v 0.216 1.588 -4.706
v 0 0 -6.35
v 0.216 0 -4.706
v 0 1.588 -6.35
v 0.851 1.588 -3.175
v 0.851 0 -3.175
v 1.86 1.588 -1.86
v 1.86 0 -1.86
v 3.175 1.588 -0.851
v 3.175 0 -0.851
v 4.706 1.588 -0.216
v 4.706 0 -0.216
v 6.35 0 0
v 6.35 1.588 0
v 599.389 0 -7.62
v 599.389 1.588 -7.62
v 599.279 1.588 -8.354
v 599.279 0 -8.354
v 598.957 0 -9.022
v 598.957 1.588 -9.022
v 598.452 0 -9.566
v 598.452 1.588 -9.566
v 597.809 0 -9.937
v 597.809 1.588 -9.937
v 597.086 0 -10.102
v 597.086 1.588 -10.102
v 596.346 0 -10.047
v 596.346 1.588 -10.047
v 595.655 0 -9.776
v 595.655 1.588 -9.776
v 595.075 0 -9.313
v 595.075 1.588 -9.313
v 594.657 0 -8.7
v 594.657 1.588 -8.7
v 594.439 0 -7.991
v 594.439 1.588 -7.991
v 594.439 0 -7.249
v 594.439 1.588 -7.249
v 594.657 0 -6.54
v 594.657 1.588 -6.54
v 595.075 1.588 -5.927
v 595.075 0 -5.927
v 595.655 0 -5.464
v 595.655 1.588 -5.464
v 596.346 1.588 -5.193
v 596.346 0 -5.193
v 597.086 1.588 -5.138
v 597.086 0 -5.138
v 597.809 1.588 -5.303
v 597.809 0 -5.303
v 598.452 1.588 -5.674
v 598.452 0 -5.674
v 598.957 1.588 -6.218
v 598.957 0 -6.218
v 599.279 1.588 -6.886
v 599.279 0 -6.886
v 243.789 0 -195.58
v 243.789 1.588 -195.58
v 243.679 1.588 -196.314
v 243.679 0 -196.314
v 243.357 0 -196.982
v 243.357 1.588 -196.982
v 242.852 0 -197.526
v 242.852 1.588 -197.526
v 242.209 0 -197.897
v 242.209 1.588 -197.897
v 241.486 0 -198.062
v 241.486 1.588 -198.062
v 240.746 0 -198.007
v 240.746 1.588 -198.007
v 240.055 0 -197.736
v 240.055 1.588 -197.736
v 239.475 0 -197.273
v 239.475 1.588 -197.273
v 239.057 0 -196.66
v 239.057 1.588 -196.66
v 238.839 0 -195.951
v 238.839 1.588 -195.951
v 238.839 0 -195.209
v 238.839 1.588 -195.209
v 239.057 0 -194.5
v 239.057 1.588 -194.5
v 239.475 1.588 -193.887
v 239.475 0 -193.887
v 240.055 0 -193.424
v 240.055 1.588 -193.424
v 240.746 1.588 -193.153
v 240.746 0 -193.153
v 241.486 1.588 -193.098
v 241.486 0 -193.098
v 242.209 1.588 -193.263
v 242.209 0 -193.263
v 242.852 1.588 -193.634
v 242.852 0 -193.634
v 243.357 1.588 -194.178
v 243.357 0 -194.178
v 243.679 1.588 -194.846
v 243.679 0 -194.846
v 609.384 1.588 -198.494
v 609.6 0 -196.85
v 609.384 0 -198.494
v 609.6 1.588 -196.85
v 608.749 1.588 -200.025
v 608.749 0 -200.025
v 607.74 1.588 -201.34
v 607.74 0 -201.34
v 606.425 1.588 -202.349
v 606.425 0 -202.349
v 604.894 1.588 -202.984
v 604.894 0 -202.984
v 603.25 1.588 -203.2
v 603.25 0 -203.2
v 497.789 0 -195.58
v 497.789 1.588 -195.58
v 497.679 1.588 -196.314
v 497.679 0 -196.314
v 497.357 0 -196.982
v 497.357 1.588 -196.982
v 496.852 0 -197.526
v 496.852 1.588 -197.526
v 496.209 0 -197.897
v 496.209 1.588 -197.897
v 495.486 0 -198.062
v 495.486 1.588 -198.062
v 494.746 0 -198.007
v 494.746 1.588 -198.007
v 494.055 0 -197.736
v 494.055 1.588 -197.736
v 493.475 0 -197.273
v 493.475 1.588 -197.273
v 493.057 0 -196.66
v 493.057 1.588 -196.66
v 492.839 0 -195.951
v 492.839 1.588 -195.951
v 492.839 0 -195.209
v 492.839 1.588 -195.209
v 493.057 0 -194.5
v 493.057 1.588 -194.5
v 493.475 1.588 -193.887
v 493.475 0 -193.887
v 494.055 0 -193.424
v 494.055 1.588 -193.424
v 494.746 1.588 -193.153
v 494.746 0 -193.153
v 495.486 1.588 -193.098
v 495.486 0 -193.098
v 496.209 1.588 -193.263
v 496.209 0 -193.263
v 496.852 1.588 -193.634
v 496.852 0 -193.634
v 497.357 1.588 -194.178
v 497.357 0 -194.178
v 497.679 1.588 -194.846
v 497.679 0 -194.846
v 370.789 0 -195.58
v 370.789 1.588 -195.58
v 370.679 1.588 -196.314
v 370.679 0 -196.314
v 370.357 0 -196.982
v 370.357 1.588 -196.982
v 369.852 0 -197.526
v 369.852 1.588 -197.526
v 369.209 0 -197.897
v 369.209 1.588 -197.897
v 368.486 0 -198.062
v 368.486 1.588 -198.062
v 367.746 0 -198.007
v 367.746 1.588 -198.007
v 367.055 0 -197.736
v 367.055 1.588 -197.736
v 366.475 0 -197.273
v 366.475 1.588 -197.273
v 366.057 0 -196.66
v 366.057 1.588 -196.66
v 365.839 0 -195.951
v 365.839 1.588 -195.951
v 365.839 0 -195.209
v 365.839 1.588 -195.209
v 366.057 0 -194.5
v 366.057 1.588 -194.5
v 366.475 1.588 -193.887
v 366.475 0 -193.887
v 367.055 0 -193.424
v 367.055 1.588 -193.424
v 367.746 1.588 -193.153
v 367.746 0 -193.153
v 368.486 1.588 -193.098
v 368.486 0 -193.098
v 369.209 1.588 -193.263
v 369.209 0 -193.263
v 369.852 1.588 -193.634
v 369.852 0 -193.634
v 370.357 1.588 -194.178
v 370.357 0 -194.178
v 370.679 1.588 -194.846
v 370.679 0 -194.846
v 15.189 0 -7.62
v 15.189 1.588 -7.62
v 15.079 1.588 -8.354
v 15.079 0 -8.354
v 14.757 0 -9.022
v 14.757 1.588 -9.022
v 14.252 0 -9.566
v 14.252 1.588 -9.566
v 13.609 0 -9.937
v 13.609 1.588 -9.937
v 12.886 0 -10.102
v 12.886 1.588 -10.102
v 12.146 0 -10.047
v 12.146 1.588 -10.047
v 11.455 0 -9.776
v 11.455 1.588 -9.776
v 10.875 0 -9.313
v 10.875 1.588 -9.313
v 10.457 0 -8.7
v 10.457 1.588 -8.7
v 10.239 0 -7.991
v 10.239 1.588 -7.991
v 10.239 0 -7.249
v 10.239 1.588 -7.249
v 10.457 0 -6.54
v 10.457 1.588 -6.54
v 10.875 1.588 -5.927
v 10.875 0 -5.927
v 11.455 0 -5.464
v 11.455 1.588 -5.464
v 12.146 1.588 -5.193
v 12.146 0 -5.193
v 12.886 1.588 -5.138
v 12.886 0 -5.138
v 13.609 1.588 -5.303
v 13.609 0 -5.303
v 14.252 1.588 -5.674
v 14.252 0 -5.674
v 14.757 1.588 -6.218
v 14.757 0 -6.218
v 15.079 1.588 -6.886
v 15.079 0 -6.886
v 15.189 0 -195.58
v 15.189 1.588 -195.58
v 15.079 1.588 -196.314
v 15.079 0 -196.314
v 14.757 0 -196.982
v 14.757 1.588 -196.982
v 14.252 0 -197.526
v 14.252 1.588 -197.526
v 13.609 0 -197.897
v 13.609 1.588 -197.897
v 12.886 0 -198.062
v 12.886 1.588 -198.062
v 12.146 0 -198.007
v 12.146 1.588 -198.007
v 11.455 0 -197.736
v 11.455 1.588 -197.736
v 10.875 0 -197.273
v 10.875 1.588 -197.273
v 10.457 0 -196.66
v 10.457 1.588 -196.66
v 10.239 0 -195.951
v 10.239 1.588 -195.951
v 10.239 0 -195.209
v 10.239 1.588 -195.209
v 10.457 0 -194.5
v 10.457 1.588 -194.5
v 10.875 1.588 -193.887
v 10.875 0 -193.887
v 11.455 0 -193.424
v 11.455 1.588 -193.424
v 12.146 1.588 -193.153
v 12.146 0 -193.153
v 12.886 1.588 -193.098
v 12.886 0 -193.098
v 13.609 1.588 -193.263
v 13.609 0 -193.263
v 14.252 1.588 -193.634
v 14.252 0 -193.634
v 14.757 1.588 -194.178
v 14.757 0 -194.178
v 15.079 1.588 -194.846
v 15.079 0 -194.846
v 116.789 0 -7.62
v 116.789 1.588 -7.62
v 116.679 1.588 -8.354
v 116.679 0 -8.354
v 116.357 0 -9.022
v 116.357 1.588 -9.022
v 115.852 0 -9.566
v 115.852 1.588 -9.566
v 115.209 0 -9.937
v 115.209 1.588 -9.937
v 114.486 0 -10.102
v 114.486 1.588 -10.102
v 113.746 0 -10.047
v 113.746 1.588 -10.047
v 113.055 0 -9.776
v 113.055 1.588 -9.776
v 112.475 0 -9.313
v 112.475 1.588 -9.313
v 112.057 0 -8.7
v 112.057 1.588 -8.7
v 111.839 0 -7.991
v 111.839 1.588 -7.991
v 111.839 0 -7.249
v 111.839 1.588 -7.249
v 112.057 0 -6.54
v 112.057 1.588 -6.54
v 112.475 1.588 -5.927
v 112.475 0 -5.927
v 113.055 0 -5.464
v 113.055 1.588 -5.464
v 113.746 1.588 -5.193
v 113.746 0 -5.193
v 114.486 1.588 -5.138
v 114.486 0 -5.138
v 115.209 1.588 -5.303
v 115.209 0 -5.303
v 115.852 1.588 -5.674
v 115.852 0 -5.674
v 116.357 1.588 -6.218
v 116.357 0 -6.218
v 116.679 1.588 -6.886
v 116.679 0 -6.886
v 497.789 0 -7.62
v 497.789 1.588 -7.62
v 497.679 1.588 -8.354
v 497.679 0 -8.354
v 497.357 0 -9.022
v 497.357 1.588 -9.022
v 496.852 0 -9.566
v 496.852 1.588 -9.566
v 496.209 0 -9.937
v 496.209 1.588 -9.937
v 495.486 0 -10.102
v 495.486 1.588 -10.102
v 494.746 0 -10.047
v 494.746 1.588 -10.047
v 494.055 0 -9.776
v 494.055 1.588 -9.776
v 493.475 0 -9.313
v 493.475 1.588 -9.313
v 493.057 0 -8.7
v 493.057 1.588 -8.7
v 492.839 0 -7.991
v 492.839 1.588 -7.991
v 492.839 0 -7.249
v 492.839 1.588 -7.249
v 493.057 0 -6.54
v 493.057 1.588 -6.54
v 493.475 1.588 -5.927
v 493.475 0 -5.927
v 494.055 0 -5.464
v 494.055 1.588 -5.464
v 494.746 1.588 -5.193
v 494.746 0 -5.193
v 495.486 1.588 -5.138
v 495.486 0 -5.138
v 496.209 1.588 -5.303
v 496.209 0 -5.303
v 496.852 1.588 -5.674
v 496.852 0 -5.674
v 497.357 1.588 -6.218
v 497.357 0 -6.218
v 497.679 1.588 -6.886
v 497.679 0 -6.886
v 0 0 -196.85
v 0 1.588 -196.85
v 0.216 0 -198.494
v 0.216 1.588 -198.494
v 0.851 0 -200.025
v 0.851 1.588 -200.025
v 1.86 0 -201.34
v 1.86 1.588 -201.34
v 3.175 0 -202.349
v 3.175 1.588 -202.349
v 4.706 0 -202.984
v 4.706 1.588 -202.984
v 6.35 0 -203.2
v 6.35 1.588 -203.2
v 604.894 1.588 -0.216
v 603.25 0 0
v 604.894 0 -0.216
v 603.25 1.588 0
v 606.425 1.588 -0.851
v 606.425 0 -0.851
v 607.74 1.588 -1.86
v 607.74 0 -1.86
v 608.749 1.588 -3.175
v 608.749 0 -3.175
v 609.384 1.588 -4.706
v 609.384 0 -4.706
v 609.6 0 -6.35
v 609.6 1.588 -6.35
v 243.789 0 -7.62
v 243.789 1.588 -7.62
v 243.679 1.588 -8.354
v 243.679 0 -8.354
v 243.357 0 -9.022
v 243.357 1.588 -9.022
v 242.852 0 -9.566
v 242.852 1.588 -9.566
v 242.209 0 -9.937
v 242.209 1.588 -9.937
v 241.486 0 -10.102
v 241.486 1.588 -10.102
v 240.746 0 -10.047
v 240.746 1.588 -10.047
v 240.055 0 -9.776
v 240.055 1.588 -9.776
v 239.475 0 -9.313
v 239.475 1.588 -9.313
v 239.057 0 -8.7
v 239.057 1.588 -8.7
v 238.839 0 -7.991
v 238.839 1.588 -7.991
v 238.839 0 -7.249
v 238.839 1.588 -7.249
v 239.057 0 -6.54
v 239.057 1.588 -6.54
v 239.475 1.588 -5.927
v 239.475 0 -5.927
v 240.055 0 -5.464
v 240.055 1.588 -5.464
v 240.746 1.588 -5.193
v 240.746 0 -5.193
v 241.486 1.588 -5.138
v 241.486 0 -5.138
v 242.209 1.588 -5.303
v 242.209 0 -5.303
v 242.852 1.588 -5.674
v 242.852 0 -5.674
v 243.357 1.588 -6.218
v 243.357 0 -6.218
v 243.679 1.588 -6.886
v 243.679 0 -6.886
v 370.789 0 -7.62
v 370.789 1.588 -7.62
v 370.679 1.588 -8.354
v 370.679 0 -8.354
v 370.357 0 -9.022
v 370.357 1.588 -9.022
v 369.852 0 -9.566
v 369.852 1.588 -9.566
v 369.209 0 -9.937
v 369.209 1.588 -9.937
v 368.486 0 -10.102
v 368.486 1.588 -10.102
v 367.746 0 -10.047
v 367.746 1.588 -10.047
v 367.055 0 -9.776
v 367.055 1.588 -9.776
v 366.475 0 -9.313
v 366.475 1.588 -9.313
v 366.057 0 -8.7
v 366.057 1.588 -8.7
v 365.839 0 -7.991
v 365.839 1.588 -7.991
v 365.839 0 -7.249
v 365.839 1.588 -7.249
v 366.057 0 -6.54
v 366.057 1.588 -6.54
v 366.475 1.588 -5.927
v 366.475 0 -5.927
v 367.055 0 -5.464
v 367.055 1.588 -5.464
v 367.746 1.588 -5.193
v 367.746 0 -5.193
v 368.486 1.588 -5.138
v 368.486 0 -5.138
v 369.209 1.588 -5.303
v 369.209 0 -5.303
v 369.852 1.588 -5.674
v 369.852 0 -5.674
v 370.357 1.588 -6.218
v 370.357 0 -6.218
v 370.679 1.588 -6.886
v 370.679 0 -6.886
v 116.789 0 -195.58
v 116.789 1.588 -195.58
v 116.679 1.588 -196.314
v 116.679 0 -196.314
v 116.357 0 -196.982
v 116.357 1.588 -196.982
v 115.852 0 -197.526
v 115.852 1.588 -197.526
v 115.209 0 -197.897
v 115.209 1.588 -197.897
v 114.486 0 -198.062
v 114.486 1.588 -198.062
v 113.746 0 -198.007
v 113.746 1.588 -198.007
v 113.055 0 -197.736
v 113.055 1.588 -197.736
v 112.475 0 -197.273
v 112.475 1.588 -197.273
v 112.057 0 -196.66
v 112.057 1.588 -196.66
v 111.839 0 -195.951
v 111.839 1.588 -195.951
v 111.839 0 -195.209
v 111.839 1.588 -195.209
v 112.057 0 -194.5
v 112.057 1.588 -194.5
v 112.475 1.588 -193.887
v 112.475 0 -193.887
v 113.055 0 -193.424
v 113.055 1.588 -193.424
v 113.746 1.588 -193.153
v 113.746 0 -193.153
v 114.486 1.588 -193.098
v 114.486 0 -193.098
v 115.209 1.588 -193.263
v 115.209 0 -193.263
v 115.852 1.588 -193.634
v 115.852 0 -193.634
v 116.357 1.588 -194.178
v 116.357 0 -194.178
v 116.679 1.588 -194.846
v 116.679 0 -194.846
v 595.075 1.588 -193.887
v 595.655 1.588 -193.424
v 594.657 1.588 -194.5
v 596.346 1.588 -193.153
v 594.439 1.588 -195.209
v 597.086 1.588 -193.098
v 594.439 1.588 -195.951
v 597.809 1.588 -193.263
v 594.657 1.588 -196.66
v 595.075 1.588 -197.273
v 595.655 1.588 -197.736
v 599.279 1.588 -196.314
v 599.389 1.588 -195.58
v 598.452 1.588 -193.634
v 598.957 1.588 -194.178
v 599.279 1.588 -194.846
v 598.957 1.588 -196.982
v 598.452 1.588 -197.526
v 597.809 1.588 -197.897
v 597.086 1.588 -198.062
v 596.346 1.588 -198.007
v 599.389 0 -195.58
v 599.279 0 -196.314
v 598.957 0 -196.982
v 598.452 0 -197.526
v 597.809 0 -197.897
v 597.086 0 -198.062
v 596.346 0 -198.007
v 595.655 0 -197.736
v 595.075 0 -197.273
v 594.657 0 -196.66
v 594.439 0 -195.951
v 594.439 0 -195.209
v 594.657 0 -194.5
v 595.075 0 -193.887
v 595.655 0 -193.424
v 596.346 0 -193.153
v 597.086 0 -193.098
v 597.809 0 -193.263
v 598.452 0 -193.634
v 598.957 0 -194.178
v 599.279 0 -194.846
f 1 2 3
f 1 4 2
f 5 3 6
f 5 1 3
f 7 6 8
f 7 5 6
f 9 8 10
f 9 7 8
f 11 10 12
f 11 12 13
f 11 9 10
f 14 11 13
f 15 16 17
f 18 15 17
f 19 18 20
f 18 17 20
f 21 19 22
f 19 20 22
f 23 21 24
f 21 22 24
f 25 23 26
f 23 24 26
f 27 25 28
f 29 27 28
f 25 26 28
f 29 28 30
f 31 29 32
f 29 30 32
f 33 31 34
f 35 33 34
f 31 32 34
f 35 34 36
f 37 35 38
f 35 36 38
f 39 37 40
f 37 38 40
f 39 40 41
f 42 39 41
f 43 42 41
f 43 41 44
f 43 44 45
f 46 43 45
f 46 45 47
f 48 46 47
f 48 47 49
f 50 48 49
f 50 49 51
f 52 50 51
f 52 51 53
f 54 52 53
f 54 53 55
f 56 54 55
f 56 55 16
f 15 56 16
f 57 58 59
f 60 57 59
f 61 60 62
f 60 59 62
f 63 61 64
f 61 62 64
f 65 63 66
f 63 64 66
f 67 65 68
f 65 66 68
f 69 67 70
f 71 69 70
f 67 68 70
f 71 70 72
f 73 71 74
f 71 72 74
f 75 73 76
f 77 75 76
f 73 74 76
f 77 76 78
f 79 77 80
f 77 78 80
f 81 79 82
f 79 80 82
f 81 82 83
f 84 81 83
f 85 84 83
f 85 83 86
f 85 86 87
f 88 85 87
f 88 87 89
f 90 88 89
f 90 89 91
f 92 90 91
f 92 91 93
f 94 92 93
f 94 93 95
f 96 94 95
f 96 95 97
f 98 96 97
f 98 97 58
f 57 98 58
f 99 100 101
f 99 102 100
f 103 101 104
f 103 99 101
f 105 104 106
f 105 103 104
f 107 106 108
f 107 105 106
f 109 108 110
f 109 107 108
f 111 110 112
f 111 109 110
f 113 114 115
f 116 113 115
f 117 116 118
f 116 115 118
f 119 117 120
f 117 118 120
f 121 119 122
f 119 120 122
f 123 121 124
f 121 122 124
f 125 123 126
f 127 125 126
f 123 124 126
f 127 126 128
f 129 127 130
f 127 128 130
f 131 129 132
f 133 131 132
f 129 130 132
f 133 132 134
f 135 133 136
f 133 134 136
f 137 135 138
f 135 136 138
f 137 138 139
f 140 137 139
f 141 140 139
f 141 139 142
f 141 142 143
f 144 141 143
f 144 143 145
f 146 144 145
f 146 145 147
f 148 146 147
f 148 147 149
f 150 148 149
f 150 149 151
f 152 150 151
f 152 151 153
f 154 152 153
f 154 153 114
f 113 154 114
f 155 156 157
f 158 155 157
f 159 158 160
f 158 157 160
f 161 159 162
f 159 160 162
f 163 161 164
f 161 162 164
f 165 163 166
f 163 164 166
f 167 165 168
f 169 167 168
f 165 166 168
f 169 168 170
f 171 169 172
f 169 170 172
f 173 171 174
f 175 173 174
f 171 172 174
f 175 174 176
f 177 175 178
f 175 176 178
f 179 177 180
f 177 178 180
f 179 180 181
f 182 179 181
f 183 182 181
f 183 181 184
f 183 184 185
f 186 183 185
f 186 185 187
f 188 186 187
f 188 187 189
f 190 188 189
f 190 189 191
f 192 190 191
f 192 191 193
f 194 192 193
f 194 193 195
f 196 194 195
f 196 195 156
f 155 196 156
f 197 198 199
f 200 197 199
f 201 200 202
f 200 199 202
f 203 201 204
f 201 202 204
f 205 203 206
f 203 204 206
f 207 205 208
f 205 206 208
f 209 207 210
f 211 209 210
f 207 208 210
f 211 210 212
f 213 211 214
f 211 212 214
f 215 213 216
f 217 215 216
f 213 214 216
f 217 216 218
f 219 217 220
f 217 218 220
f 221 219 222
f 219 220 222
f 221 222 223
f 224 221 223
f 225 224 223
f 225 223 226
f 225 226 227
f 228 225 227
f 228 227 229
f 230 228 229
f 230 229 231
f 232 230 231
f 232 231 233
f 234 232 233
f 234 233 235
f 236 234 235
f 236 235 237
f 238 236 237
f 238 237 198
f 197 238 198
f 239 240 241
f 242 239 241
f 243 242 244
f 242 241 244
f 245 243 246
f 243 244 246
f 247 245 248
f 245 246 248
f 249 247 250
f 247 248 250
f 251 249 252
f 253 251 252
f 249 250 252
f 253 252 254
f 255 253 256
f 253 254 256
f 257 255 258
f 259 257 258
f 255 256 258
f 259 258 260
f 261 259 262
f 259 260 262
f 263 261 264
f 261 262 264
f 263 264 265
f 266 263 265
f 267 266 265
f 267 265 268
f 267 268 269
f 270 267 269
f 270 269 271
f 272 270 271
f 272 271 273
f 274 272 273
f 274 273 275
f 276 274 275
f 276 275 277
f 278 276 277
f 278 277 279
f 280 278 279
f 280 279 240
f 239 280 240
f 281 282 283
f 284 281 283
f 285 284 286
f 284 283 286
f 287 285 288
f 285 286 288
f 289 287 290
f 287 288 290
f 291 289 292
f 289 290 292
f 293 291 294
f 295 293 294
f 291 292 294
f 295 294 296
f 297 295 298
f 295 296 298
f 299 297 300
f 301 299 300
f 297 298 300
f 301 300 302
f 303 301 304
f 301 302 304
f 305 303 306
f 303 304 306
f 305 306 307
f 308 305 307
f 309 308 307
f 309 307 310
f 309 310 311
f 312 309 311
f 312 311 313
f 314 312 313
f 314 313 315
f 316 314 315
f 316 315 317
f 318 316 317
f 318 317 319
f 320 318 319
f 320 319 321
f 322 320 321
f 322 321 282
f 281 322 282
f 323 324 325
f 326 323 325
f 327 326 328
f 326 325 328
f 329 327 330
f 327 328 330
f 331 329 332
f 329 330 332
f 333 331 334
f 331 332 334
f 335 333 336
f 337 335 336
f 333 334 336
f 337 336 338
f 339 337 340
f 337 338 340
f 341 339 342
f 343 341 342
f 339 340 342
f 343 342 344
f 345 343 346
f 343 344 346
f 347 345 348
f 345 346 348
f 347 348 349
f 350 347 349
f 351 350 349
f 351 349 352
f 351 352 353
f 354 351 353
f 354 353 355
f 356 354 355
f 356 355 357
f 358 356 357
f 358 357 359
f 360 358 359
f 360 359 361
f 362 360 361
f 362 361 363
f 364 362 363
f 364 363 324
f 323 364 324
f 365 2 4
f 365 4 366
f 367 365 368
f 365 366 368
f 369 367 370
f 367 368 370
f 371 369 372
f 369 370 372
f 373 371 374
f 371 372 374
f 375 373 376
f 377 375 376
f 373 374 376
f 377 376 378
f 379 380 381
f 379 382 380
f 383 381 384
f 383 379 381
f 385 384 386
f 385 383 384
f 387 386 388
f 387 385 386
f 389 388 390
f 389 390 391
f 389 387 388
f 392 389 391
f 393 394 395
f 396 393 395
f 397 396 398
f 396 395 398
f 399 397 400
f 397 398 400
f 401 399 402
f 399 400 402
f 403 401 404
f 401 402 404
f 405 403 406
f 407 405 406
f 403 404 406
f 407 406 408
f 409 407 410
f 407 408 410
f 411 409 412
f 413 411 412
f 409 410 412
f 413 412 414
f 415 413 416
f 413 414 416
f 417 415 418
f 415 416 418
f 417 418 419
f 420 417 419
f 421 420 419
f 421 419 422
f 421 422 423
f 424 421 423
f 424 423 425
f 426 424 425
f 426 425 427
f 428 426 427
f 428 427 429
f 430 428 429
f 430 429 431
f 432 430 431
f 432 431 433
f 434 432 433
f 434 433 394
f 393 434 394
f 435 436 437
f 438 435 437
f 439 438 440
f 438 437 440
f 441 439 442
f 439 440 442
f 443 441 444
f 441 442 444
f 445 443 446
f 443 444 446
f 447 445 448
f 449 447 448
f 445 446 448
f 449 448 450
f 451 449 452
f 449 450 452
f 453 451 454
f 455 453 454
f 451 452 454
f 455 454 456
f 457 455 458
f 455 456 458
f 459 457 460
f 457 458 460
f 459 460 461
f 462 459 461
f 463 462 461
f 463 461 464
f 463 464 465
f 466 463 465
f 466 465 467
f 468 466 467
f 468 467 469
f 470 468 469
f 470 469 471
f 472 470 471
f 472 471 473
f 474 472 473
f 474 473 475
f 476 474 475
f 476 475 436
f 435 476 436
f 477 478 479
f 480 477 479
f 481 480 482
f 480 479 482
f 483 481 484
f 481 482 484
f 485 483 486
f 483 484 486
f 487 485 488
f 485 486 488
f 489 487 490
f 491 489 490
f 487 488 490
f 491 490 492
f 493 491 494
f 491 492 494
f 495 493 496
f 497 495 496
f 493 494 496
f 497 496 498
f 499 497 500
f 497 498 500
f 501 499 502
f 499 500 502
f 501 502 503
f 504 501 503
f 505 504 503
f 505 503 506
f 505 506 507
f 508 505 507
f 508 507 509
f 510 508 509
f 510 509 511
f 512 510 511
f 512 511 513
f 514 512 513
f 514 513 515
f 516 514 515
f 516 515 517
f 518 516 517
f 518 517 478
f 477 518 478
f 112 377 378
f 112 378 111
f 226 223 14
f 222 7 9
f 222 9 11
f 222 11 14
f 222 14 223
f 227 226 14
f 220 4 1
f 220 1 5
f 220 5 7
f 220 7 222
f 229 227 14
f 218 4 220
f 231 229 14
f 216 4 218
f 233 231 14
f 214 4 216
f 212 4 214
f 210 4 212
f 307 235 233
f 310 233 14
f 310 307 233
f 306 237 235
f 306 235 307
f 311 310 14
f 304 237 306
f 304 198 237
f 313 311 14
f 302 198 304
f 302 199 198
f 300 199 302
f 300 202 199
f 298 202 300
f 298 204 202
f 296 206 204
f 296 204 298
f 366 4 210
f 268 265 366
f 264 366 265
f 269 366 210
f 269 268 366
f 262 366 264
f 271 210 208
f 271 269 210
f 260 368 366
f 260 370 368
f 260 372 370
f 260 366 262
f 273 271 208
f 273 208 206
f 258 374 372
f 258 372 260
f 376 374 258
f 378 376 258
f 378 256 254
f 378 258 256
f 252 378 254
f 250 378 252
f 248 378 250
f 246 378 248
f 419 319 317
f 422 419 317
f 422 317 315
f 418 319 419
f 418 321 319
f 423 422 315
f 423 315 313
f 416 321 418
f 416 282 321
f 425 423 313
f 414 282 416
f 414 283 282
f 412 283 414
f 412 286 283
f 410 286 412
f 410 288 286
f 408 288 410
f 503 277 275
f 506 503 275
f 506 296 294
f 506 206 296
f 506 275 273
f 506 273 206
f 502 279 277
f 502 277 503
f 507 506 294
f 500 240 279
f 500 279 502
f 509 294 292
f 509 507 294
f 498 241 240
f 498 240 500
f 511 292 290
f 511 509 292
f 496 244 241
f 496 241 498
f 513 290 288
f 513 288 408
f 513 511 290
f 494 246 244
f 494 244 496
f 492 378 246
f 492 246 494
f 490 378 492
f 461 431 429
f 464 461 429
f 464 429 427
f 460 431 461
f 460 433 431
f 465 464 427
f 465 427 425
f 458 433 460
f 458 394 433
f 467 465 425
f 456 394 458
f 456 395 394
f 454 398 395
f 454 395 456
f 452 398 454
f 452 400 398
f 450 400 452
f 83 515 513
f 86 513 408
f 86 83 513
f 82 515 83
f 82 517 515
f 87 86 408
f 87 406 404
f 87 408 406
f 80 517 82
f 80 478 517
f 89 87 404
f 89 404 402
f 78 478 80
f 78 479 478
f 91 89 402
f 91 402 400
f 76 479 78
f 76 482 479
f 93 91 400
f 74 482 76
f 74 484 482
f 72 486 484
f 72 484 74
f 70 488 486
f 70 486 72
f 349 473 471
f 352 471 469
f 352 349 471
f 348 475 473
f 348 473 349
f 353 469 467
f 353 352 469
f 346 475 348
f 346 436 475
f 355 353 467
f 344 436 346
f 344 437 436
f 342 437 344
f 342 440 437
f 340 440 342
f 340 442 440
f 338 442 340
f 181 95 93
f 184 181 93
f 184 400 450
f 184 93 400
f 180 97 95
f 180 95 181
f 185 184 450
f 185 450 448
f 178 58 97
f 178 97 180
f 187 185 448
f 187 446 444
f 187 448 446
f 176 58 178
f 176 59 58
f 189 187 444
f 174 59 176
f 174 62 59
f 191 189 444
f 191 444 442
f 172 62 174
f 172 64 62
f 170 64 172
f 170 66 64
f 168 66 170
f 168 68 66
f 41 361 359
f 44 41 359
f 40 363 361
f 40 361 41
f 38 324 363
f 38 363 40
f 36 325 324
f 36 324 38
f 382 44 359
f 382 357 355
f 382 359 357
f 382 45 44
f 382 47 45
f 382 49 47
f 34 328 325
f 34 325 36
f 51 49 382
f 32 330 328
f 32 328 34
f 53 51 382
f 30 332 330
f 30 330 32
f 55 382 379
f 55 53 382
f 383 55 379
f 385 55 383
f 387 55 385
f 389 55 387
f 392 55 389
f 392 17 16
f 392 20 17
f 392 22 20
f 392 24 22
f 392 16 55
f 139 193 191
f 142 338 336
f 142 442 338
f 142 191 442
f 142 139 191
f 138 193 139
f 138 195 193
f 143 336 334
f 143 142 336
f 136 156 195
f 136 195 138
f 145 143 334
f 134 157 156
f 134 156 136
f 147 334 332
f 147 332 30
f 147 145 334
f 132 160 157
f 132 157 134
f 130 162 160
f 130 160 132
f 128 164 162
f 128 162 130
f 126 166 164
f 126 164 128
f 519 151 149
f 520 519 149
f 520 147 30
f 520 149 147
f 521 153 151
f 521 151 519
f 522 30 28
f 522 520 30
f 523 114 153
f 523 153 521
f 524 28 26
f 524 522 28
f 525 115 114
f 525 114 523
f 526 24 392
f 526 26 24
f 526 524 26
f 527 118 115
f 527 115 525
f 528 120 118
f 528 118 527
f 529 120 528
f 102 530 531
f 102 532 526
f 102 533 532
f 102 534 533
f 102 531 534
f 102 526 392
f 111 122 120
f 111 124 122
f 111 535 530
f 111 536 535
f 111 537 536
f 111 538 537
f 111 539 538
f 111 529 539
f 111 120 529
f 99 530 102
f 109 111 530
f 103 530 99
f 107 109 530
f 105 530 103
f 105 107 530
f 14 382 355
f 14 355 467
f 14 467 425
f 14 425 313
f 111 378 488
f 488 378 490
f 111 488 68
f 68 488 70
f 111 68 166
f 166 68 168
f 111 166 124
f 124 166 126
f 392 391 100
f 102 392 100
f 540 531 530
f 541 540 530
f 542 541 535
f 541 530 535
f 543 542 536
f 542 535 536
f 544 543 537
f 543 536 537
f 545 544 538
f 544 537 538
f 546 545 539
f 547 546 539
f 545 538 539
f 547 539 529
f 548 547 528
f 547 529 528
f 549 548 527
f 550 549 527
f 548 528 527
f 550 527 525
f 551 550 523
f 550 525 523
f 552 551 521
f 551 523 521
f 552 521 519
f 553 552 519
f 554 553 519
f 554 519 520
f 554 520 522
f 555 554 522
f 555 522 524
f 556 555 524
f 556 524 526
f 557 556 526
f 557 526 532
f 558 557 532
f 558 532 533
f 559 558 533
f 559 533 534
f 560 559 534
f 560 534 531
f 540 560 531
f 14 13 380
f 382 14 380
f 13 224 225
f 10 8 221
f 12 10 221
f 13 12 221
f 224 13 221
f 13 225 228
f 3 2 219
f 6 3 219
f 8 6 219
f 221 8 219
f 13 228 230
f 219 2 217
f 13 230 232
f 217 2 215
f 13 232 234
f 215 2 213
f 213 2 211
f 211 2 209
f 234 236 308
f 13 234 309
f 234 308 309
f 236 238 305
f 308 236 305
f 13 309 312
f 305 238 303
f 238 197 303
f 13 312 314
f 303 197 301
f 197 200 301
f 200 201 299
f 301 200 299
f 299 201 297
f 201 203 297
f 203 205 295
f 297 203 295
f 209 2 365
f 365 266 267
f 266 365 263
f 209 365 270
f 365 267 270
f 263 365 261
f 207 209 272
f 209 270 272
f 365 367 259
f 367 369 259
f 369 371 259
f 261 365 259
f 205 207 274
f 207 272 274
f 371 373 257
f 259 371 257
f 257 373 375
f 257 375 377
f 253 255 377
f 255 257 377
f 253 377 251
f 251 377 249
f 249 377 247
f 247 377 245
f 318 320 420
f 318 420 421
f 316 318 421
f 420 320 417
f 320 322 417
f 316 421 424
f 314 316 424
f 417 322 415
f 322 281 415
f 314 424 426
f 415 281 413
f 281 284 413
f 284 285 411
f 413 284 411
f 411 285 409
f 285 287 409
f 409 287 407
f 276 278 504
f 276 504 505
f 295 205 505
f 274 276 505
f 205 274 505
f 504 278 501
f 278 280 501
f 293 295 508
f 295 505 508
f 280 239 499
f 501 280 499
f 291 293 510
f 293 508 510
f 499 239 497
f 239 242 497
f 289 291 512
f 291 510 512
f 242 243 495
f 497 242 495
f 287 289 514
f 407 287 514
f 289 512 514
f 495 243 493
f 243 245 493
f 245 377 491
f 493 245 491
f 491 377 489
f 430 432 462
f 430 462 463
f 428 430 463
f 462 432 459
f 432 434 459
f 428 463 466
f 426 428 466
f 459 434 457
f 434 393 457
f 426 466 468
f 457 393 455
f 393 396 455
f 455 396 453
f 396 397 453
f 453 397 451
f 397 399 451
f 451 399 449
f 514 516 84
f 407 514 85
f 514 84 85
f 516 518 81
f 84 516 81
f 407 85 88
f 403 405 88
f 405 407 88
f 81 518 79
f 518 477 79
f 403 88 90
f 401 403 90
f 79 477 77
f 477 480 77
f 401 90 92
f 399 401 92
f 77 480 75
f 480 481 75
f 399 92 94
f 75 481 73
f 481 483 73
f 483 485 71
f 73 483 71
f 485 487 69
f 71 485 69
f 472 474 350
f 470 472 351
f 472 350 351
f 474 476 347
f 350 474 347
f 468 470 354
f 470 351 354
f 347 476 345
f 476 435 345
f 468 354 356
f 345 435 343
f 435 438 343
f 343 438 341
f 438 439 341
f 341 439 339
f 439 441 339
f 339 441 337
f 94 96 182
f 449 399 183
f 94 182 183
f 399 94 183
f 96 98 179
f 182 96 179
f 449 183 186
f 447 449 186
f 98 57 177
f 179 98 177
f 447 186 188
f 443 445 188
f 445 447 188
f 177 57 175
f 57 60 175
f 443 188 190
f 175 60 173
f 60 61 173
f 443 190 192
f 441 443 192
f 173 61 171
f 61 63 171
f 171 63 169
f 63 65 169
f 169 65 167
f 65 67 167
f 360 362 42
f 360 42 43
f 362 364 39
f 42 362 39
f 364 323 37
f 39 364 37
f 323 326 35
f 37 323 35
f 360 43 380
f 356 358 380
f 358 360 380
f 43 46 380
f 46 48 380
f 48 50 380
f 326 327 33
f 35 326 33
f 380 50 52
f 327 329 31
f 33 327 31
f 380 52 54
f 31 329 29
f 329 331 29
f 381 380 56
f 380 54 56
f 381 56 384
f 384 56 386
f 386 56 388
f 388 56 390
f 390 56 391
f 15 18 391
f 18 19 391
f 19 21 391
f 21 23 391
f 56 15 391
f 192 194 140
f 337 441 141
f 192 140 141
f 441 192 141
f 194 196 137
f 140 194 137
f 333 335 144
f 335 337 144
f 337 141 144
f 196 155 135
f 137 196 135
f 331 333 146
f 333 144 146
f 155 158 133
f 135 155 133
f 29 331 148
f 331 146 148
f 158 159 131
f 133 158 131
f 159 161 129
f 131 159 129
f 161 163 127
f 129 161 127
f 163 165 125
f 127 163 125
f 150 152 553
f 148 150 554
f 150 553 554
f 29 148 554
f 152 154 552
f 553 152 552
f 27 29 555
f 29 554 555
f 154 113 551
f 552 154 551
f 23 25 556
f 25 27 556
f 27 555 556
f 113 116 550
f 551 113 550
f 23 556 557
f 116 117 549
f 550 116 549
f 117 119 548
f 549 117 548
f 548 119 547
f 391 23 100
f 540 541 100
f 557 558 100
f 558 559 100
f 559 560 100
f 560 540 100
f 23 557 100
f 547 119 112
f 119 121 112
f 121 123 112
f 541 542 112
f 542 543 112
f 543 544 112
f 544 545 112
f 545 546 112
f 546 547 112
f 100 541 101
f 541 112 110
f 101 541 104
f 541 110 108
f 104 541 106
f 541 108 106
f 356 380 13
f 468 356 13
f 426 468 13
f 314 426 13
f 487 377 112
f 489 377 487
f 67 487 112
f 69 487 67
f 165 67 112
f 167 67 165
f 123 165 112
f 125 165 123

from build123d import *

# Parameters (mm, degrees)
SKETCH1_W           = 609.6
SKETCH1_H           = 203.2
BOSS_EXTRUDE1_DEPTH = 1.5875
FILLET1_R           = 6.35
SKETCH2_R           = 2.4892
CUT_EXTRUDE1_DEPTH  = 2.5875


with BuildPart() as part:
    # Sketch1 → Boss-Extrude1 (new body)
    with BuildSketch(Plane(origin=(0, 0, 0), x_dir=(1, 0, 0), z_dir=(0, 1, 0))):
        with Locations((304.8, 101.6)):
            Rectangle(SKETCH1_W, SKETCH1_H)
    extrude(amount=BOSS_EXTRUDE1_DEPTH)

    # Fillet1
    fillet1_edges = [part.edges().sort_by_distance(p)[0] for p in [
        (0, 0.79375, -203.2),
        (609.6, 0.79375, -203.2),
        (609.6, 0.79375, 0),
        (0, 0.79375, 0),
    ]]
    fillet(fillet1_edges, radius=FILLET1_R)

    # Sketch2 → Cut-Extrude1 (cut, through all)
    with BuildSketch(Plane(origin=(0, 1.5875, 0), x_dir=(1, 0, 0), z_dir=(0, 1, 0))):
        with Locations((12.7, 7.62)):
            Circle(SKETCH2_R)
        with Locations((596.9, 7.62)):
            Circle(SKETCH2_R)
        with Locations((114.3, 7.62)):
            Circle(SKETCH2_R)
        with Locations((495.3, 7.62)):
            Circle(SKETCH2_R)
        with Locations((241.3, 7.62)):
            Circle(SKETCH2_R)
        with Locations((368.3, 7.62)):
            Circle(SKETCH2_R)
        with Locations((368.3, 195.58)):
            Circle(SKETCH2_R)
        with Locations((241.3, 195.58)):
            Circle(SKETCH2_R)
        with Locations((495.3, 195.58)):
            Circle(SKETCH2_R)
        with Locations((114.3, 195.58)):
            Circle(SKETCH2_R)
        with Locations((596.9, 195.58)):
            Circle(SKETCH2_R)
        with Locations((12.7, 195.58)):
            Circle(SKETCH2_R)
    extrude(amount=-CUT_EXTRUDE1_DEPTH, mode=Mode.SUBTRACT)


solid = part.part
